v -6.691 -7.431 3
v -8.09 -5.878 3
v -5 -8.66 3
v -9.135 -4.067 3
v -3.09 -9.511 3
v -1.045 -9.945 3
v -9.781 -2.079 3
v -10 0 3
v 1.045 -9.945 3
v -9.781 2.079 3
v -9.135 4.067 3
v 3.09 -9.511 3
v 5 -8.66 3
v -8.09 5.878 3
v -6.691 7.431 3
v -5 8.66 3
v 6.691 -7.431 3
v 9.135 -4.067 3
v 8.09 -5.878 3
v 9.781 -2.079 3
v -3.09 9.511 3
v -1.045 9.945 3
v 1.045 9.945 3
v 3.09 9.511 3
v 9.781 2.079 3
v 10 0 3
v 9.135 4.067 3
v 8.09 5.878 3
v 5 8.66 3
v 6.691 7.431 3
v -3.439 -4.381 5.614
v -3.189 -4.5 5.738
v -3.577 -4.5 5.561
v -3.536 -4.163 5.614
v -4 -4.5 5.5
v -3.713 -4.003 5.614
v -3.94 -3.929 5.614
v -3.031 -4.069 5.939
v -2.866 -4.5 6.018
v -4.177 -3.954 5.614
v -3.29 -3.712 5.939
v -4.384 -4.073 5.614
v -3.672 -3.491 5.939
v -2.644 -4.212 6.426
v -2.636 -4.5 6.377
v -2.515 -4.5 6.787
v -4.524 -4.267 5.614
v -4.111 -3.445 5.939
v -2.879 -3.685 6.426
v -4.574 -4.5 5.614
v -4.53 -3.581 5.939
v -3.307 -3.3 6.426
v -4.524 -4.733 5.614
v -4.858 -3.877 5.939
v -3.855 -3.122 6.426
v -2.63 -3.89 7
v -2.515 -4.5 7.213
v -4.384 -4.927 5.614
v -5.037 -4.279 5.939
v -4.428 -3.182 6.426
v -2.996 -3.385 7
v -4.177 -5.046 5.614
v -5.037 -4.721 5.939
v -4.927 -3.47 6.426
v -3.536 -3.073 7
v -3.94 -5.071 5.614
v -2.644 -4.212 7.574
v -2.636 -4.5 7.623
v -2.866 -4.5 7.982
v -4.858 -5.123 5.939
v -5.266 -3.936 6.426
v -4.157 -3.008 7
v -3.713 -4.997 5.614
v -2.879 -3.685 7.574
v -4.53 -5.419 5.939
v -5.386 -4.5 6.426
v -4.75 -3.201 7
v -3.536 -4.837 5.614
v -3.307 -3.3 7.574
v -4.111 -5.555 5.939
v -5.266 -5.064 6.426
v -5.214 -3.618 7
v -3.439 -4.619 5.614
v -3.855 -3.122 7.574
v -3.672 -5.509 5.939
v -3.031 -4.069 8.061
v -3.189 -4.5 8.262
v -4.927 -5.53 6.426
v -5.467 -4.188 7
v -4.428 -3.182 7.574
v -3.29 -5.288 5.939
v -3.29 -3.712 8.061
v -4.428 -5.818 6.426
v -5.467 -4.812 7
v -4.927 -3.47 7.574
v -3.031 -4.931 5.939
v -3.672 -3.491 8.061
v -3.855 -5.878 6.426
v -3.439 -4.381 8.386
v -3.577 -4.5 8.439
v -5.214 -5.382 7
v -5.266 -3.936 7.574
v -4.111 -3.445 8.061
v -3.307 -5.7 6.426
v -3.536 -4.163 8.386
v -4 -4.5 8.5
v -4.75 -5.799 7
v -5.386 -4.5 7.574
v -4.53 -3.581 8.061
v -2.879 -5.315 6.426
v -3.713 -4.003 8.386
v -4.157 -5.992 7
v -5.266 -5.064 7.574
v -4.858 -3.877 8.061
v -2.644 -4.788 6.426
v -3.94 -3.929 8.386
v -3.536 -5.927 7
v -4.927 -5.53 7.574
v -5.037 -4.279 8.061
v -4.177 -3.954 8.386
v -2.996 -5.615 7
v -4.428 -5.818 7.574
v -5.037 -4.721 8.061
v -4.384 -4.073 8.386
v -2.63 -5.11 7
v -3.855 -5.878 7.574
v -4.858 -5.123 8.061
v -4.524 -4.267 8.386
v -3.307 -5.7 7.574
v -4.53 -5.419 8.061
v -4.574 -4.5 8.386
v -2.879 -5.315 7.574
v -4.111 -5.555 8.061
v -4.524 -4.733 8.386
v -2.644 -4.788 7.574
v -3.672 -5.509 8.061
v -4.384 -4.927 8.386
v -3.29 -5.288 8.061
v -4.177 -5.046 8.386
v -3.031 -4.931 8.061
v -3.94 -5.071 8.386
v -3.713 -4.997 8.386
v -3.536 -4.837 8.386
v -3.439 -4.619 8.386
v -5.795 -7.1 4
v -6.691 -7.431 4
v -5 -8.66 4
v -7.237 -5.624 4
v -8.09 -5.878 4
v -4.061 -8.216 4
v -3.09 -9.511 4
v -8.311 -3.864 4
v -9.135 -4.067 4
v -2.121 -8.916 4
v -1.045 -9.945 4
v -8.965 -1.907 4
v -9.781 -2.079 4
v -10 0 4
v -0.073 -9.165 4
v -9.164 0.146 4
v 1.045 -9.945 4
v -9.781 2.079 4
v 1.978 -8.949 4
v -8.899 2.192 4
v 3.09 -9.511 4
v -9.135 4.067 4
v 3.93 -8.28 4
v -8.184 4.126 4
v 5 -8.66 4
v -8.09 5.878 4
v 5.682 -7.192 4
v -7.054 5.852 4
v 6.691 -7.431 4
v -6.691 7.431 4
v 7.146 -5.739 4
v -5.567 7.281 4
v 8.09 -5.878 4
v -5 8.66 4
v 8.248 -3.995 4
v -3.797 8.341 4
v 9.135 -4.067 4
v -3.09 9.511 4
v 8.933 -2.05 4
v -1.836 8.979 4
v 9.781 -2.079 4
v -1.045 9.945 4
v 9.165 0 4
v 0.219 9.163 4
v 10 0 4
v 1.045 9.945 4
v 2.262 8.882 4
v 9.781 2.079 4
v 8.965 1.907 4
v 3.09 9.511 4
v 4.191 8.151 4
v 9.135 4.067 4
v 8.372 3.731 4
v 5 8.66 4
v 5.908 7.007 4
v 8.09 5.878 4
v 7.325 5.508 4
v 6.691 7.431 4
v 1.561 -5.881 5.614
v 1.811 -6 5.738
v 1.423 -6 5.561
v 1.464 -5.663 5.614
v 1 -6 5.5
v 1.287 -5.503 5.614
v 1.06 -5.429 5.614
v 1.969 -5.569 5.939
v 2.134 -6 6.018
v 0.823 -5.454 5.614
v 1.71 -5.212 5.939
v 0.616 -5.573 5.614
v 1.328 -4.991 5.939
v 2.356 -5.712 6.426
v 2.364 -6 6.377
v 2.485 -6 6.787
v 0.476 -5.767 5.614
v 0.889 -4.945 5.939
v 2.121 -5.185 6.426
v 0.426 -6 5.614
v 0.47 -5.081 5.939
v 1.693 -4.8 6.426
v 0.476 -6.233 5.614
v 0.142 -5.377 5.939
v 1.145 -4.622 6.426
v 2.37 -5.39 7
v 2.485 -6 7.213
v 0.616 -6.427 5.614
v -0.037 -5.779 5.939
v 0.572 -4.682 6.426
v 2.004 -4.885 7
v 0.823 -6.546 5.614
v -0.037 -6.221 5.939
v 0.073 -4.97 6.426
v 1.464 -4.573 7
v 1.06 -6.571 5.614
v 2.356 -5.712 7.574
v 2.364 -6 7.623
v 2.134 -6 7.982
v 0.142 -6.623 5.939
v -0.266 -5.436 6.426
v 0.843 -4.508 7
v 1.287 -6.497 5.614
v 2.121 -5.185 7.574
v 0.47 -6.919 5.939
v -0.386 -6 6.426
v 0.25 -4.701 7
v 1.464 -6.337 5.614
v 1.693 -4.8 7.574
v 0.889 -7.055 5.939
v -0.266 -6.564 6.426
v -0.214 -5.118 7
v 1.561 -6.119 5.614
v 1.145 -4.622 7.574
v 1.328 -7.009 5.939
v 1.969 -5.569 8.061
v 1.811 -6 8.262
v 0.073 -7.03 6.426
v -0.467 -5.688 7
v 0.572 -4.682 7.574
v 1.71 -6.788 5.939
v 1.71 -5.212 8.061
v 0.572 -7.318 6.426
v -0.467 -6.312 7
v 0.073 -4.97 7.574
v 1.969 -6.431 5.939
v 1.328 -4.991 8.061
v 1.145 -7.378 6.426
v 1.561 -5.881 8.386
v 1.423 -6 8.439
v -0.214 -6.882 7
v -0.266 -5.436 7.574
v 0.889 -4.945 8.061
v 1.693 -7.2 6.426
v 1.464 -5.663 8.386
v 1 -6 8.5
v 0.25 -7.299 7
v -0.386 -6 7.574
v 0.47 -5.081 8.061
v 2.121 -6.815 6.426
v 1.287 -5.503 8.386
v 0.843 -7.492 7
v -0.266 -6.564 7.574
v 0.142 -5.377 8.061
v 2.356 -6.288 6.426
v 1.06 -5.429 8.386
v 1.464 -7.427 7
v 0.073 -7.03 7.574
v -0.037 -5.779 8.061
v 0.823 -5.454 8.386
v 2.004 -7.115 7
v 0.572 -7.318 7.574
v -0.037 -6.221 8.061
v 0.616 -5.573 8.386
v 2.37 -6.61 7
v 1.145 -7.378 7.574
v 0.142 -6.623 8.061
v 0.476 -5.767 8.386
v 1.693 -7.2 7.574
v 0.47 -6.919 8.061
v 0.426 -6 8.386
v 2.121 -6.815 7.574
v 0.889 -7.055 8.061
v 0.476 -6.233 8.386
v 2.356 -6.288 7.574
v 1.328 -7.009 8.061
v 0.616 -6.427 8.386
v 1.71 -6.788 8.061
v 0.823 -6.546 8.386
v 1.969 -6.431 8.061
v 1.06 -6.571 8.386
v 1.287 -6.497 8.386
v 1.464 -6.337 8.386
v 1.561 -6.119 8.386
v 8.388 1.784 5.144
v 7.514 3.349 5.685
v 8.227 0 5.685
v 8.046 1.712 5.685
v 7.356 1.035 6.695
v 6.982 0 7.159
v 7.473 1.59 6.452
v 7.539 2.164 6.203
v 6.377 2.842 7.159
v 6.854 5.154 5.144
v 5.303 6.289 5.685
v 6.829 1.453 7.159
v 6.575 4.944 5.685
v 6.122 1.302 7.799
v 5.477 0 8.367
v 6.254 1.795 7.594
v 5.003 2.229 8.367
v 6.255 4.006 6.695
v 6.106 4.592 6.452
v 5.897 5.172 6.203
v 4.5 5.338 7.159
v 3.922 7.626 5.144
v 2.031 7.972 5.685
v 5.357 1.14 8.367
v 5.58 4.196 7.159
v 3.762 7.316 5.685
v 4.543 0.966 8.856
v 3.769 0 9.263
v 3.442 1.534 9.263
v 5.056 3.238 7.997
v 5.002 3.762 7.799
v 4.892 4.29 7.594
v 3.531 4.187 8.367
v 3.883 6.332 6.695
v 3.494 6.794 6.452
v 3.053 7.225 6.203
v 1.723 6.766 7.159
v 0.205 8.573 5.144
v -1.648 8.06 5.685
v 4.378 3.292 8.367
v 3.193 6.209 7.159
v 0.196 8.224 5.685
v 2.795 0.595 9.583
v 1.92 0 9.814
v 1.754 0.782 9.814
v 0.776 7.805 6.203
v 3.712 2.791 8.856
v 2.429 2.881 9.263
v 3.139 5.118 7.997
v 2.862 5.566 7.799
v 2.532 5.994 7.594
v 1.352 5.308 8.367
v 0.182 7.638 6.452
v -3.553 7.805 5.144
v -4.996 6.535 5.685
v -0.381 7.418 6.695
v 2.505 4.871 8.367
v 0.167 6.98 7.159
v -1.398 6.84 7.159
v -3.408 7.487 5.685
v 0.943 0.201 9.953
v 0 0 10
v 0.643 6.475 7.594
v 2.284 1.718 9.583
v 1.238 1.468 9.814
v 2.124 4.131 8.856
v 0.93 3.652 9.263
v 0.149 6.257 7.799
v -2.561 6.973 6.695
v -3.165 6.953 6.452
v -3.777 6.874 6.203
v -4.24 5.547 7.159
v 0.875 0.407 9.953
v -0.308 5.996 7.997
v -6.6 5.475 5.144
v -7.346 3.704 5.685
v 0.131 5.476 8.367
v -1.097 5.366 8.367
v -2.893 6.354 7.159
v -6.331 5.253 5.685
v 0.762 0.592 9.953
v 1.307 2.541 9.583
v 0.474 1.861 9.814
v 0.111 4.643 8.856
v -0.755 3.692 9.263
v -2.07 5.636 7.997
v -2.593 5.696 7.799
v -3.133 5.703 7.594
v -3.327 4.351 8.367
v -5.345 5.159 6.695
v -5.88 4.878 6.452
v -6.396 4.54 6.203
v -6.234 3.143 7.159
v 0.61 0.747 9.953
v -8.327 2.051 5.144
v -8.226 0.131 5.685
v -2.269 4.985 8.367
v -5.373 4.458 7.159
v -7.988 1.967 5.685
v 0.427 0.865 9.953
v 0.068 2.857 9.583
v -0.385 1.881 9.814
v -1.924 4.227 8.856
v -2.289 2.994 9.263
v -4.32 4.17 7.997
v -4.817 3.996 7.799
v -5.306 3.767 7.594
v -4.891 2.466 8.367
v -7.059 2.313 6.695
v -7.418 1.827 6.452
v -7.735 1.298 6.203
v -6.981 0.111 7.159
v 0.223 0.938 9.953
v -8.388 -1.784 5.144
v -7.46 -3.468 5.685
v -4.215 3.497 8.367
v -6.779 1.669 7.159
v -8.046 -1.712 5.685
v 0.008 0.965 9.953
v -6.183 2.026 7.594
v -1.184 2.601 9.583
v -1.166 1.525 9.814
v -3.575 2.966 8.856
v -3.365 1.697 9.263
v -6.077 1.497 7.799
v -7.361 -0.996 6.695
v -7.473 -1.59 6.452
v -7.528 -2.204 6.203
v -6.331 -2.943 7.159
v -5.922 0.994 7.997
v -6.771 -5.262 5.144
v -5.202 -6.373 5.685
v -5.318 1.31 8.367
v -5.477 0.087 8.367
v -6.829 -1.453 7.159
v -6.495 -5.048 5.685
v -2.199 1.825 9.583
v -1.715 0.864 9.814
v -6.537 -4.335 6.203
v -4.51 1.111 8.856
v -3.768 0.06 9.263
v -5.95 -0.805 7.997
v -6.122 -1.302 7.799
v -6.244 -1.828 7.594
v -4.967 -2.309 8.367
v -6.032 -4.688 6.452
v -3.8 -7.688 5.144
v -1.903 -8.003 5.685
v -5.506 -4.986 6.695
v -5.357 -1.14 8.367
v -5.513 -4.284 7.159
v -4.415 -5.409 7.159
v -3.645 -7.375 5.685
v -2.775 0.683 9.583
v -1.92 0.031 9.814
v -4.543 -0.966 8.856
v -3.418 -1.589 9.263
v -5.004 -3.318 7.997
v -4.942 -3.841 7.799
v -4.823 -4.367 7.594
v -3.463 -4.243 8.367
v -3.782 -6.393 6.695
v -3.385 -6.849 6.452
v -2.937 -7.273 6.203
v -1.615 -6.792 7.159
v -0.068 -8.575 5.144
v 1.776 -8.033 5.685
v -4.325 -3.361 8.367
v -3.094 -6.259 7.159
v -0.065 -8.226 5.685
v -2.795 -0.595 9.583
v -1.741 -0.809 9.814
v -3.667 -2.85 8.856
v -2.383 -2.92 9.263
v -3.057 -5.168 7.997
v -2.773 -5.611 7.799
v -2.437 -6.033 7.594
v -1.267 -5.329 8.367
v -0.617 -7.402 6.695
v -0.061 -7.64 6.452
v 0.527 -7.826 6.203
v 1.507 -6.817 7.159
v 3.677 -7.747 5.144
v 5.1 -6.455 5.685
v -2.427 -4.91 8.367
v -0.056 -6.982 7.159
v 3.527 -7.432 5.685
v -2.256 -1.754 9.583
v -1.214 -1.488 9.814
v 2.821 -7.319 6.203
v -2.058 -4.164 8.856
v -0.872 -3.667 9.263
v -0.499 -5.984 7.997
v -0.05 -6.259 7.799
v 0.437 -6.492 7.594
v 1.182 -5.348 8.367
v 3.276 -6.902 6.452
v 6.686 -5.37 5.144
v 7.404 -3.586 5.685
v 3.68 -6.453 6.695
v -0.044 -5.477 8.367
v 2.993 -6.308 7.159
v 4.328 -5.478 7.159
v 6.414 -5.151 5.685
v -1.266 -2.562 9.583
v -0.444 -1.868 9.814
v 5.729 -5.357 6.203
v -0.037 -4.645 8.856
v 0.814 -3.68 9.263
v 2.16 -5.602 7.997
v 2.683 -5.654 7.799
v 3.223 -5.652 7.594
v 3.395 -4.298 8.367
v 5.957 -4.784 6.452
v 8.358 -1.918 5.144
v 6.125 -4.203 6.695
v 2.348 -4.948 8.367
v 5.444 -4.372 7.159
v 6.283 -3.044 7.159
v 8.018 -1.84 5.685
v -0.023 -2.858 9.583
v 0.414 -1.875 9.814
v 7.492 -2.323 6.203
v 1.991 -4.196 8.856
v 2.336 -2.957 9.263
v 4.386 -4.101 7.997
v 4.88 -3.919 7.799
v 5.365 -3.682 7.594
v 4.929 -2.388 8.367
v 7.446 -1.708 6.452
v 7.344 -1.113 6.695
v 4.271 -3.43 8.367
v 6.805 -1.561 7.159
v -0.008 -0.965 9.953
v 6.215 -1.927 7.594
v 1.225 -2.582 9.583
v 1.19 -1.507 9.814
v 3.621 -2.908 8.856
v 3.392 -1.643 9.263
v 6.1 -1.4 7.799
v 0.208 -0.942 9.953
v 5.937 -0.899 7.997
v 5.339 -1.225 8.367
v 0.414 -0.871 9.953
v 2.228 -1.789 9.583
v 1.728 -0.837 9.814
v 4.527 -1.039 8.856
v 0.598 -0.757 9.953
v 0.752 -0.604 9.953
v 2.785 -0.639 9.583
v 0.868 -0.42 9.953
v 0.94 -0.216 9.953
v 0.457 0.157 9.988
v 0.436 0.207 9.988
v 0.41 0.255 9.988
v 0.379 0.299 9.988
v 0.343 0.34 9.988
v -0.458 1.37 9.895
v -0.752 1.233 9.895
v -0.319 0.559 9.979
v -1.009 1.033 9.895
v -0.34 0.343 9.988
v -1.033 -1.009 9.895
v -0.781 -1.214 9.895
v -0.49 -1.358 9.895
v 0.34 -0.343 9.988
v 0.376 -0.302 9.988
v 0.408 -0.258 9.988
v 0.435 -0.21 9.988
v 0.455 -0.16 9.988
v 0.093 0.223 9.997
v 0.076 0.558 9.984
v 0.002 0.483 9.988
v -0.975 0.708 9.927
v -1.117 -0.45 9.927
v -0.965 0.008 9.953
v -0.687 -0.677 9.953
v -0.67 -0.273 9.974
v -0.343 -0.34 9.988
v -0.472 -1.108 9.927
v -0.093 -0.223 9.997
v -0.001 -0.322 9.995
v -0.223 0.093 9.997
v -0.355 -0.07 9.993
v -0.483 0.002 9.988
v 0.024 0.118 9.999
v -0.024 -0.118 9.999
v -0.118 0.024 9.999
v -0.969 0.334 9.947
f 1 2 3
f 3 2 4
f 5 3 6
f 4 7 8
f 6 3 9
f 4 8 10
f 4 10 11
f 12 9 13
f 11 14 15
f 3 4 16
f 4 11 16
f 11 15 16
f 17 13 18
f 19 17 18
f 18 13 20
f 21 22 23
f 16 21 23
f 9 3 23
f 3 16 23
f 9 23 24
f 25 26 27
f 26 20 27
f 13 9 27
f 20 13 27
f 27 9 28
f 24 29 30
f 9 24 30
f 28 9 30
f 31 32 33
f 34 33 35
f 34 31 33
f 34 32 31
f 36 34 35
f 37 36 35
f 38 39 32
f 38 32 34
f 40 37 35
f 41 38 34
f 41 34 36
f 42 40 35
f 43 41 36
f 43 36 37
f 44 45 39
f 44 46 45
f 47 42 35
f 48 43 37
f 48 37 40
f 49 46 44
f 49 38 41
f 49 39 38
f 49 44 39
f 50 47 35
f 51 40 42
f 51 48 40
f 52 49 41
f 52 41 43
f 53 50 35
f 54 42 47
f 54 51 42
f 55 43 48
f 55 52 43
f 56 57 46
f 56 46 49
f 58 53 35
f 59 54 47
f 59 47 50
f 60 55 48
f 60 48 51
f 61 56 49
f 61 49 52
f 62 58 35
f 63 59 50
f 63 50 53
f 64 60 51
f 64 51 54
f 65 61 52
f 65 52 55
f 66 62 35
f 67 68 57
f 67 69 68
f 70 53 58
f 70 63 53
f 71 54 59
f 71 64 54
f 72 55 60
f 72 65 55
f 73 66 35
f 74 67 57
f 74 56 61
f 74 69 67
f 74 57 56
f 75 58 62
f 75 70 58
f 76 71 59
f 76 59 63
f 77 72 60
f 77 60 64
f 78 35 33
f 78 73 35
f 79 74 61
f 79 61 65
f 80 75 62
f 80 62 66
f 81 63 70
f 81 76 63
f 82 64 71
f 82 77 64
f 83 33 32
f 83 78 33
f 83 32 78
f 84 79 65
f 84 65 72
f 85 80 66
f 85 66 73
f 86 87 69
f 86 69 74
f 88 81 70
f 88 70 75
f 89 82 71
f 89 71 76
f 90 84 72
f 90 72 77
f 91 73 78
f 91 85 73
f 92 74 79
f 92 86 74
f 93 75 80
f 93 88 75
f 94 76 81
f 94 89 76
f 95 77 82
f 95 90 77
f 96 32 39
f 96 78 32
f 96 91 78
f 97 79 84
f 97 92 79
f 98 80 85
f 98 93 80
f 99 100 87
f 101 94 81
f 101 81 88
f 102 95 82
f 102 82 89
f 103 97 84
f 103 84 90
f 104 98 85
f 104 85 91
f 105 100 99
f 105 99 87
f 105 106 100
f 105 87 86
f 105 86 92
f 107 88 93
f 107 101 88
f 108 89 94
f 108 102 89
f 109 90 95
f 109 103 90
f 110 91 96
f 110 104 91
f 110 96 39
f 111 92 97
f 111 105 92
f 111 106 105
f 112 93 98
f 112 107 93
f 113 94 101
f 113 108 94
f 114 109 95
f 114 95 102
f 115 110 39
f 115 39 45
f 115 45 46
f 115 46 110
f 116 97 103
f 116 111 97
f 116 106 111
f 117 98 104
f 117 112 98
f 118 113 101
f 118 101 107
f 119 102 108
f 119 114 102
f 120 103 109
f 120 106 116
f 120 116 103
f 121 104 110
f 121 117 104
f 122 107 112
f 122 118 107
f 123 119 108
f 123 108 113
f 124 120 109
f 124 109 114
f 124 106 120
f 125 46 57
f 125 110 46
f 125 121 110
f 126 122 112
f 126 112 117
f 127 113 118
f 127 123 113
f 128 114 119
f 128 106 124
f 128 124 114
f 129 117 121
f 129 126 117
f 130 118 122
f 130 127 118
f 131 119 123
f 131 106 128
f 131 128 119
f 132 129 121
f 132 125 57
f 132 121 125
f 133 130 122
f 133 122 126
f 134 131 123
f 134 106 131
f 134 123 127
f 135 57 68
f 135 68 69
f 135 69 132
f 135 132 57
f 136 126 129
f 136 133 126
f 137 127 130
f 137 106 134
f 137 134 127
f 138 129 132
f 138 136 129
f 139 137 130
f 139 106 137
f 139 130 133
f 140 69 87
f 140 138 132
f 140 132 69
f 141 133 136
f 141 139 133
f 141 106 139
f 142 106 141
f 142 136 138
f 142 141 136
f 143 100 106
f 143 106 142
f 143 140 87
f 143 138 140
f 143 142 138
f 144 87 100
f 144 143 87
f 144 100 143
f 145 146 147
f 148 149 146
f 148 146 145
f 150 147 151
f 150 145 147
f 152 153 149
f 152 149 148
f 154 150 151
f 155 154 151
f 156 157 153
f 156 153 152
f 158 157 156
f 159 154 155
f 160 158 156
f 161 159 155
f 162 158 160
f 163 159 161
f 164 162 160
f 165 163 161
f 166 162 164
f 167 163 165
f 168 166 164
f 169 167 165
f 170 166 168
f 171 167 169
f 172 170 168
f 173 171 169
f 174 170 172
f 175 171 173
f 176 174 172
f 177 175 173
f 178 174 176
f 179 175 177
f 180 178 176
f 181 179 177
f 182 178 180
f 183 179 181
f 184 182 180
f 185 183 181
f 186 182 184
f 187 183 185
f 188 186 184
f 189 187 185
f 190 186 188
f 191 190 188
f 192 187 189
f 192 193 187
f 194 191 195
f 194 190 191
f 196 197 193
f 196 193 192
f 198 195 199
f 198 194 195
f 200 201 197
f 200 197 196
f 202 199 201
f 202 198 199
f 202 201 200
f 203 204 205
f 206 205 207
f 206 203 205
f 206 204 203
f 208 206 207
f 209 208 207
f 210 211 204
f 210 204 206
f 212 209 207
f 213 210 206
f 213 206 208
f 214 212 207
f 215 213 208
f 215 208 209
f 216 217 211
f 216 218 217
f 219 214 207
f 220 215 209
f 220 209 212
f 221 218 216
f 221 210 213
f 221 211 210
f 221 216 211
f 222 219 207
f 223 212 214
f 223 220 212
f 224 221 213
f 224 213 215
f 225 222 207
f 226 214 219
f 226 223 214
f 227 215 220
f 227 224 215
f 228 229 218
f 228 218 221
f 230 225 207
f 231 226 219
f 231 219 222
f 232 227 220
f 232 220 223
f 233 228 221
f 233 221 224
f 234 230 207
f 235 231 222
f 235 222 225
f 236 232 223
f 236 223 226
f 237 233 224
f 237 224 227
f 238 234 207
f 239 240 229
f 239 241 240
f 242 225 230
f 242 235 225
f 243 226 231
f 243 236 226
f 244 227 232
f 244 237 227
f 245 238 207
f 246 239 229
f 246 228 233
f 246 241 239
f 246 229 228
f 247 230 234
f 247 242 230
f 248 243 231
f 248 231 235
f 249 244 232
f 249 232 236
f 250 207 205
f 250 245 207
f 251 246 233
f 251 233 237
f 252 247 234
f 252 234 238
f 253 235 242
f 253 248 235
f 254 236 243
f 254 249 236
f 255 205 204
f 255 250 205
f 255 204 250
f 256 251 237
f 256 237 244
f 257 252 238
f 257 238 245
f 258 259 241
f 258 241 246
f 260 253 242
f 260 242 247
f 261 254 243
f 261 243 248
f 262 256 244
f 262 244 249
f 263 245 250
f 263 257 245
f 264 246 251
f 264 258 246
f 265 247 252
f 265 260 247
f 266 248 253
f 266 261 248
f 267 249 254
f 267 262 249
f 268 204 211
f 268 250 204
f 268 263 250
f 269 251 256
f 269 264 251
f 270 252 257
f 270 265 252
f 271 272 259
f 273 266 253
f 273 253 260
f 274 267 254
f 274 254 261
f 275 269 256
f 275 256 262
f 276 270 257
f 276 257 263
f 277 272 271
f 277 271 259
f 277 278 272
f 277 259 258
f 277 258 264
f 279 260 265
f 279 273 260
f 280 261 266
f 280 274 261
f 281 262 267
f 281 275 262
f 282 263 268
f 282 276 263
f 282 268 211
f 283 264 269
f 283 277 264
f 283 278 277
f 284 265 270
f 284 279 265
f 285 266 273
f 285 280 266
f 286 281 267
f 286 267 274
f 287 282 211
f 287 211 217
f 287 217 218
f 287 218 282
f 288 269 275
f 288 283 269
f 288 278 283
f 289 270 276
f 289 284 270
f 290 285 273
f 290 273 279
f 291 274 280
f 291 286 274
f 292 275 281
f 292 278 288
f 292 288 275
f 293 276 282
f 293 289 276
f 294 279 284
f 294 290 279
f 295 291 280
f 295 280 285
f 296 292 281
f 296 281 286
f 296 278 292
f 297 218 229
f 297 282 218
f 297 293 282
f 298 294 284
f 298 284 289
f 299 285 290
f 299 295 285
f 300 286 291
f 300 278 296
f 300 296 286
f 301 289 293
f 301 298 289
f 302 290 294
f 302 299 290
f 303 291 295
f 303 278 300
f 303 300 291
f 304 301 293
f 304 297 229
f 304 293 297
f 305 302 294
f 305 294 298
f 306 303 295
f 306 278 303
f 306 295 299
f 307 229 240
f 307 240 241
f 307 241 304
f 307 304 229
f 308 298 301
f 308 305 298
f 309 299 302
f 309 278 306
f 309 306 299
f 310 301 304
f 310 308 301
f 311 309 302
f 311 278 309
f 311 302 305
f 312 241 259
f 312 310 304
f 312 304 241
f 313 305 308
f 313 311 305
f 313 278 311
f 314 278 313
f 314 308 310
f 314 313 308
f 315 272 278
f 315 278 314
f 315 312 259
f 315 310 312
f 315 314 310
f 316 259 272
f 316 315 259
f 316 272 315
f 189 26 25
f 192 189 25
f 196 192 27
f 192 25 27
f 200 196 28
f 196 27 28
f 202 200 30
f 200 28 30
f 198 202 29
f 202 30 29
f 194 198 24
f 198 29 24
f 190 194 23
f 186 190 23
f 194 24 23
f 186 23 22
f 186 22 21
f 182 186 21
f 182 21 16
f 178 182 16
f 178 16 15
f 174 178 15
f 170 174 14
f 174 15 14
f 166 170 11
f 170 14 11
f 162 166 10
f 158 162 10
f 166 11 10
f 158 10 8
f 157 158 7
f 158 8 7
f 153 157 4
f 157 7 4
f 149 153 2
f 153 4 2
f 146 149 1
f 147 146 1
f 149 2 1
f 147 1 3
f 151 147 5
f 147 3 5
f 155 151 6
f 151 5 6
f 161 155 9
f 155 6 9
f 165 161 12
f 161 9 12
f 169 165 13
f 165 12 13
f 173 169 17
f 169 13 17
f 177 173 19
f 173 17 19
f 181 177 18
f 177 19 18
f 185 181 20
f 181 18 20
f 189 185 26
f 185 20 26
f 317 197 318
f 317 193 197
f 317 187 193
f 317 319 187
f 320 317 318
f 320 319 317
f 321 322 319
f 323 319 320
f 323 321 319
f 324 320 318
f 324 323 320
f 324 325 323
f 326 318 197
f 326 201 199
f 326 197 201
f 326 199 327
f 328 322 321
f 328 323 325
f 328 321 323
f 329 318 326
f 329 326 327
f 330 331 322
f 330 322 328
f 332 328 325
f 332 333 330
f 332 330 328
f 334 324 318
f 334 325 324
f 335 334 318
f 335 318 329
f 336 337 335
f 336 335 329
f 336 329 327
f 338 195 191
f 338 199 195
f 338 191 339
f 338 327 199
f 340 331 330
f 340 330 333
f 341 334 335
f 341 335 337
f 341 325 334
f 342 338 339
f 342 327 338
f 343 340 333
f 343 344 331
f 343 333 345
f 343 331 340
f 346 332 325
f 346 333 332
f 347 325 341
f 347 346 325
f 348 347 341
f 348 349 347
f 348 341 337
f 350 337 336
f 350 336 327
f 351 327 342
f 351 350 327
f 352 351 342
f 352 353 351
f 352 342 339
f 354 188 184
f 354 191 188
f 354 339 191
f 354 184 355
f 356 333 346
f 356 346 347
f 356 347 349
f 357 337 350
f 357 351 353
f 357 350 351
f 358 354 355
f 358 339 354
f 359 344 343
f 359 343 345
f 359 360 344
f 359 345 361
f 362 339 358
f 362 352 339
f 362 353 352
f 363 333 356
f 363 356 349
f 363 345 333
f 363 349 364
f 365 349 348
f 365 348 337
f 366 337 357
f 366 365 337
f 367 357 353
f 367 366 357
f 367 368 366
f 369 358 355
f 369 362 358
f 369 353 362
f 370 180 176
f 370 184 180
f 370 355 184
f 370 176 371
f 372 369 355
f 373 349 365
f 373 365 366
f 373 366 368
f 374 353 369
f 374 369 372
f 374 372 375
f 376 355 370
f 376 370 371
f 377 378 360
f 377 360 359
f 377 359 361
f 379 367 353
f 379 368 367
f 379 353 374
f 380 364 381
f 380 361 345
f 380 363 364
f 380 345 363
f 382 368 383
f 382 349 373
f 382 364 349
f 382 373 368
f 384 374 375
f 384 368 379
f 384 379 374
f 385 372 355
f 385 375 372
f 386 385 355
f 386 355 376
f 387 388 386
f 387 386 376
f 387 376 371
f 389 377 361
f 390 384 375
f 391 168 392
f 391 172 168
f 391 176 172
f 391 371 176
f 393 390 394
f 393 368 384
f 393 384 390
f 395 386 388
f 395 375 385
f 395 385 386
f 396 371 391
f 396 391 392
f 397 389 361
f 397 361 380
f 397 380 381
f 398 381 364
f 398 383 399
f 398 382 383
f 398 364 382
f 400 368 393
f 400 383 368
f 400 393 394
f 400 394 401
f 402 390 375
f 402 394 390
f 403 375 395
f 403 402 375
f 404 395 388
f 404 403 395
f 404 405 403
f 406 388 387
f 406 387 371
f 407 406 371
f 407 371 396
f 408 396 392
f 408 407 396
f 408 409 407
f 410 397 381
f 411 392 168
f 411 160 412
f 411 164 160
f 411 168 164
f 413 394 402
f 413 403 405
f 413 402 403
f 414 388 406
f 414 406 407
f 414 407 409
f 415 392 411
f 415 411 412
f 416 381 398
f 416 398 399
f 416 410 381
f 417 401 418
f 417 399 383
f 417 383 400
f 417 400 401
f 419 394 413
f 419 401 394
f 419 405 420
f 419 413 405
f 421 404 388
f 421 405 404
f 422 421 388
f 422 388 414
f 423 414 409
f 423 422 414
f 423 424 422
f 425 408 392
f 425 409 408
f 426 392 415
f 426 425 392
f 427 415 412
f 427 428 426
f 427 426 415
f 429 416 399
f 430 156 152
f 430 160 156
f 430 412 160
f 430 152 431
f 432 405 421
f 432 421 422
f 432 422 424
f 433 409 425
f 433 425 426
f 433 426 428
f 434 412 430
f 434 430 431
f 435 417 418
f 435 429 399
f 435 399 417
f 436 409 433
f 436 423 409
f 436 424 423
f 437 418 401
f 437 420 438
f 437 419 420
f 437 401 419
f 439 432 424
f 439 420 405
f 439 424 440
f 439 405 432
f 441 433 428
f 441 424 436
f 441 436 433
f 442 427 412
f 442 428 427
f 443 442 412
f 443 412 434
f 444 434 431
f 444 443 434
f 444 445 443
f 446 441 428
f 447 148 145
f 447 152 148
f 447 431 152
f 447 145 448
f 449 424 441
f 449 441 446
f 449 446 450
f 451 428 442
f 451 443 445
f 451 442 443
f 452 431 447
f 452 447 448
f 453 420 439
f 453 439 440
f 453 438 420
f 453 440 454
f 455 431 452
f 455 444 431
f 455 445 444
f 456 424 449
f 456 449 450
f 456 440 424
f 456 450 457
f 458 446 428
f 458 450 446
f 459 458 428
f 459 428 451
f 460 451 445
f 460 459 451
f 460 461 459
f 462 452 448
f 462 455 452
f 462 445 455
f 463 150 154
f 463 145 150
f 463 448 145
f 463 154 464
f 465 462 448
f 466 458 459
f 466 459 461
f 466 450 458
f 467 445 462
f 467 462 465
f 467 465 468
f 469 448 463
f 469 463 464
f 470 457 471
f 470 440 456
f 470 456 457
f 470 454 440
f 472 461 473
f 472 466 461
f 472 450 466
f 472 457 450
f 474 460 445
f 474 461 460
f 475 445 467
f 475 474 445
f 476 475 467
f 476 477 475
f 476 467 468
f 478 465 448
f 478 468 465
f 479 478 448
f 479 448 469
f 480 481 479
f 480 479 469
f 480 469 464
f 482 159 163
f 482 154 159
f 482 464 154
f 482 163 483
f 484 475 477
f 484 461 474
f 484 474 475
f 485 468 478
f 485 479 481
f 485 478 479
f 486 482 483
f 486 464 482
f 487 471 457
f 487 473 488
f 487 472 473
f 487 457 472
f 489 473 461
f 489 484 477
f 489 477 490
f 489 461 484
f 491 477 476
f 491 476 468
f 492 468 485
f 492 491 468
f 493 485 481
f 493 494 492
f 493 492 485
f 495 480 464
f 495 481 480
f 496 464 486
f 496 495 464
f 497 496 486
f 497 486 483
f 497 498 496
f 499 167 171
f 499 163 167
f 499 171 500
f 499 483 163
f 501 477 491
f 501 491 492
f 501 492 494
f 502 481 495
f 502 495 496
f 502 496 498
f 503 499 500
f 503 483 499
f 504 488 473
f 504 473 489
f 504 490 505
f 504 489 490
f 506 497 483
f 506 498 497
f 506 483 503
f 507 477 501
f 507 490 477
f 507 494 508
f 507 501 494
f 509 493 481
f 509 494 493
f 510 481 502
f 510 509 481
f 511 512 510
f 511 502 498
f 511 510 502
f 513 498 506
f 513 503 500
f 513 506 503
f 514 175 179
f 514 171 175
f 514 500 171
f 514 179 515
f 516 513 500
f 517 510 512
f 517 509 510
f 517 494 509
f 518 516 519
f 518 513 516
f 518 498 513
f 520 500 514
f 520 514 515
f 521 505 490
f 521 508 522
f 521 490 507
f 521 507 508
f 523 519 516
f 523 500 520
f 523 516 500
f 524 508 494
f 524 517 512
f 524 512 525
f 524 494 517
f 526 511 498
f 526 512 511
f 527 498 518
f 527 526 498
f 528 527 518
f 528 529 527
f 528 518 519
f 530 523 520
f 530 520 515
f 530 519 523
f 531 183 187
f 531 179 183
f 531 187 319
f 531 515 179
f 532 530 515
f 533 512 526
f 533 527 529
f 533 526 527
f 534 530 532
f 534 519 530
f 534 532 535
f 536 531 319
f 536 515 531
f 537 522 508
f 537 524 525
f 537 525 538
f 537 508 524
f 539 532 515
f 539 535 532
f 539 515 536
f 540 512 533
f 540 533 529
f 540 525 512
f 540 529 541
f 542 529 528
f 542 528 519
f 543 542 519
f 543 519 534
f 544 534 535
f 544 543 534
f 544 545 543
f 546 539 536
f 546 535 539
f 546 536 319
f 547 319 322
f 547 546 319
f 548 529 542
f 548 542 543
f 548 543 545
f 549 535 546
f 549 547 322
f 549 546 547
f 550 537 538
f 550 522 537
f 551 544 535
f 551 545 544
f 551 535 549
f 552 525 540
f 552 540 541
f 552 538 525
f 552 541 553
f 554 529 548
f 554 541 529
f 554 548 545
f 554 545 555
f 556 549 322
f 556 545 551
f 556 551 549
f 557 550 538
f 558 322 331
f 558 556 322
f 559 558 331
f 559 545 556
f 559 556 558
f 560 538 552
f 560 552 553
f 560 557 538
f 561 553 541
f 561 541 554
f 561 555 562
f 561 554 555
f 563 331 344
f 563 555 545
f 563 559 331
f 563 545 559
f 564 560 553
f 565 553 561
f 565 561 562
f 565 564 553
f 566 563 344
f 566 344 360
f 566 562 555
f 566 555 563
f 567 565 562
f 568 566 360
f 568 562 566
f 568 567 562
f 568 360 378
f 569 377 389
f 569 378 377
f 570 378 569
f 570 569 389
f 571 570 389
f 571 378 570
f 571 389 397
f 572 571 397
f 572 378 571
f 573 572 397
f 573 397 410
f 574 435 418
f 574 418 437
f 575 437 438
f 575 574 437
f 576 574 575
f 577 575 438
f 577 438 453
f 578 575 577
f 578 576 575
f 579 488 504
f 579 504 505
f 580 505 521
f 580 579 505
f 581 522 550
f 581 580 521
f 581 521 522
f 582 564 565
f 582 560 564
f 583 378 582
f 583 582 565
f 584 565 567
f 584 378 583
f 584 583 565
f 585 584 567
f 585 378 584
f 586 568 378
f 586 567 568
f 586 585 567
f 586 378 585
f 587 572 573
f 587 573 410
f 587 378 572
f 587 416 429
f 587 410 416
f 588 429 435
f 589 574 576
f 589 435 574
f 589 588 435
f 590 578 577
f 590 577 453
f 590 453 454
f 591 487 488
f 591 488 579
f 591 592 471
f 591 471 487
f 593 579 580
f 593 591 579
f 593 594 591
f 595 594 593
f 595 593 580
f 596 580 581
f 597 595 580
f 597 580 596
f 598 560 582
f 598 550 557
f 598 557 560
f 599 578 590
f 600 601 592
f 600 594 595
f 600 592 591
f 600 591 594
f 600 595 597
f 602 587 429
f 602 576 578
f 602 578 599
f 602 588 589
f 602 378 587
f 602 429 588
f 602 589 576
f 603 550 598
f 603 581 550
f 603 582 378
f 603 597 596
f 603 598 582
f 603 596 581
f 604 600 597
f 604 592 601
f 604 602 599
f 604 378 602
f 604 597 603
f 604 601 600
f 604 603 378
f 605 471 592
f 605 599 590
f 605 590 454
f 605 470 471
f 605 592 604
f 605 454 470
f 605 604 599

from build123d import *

# Parameters (mm, degrees)
CYLINDER_R     = 10
CYLINDER_DEPTH = 1


with BuildPart() as cilindre:
    # Cylinder → Cylinder (new body)
    with BuildSketch(Plane.XY.offset(3)):
        Circle(CYLINDER_R)
    extrude(amount=CYLINDER_DEPTH)


with BuildPart() as fusion:
    # Sphere → Sphere (revolve)
    with BuildSketch(Plane.XZ):
        with BuildLine():
            ThreePointArc((9.396926, 3.420201), (5.735764, 8.19152), (0, 10))
            Line((0, 10), (0, 3.420201))
            Line((0, 3.420201), (9.396926, 3.420201))
        make_face()
    revolve(axis=Axis((0, 0, 0), (0, 0, 1)))

    # Fusion: union Cilindre
    add(cilindre.part)


with BuildPart() as esfera001:
    # Sphere001 → Sphere001 (revolve)
    with BuildSketch(Plane(origin=(1, -6, 7), x_dir=(1, 0, 0), z_dir=(0, -1, 0))):
        with BuildLine():
            ThreePointArc((0, -1.5), (1.5, 0), (0, 1.5))
            Line((0, 1.5), (0, -1.5))
        make_face()
    revolve(axis=Axis((1, -6, 7), (0, 0, 1)))


with BuildPart() as fusion001:
    # Sphere002 → Sphere002 (revolve)
    with BuildSketch(Plane(origin=(-4, -4.5, 7), x_dir=(1, 0, 0), z_dir=(0, -1, 0))):
        with BuildLine():
            ThreePointArc((0, -1.5), (1.5, 0), (0, 1.5))
            Line((0, 1.5), (0, -1.5))
        make_face()
    revolve(axis=Axis((-4, -4.5, 7), (0, 0, 1)))

    # Fusion001: union Esfera001
    add(esfera001.part)


solid = Compound([fusion.part, fusion001.part])
